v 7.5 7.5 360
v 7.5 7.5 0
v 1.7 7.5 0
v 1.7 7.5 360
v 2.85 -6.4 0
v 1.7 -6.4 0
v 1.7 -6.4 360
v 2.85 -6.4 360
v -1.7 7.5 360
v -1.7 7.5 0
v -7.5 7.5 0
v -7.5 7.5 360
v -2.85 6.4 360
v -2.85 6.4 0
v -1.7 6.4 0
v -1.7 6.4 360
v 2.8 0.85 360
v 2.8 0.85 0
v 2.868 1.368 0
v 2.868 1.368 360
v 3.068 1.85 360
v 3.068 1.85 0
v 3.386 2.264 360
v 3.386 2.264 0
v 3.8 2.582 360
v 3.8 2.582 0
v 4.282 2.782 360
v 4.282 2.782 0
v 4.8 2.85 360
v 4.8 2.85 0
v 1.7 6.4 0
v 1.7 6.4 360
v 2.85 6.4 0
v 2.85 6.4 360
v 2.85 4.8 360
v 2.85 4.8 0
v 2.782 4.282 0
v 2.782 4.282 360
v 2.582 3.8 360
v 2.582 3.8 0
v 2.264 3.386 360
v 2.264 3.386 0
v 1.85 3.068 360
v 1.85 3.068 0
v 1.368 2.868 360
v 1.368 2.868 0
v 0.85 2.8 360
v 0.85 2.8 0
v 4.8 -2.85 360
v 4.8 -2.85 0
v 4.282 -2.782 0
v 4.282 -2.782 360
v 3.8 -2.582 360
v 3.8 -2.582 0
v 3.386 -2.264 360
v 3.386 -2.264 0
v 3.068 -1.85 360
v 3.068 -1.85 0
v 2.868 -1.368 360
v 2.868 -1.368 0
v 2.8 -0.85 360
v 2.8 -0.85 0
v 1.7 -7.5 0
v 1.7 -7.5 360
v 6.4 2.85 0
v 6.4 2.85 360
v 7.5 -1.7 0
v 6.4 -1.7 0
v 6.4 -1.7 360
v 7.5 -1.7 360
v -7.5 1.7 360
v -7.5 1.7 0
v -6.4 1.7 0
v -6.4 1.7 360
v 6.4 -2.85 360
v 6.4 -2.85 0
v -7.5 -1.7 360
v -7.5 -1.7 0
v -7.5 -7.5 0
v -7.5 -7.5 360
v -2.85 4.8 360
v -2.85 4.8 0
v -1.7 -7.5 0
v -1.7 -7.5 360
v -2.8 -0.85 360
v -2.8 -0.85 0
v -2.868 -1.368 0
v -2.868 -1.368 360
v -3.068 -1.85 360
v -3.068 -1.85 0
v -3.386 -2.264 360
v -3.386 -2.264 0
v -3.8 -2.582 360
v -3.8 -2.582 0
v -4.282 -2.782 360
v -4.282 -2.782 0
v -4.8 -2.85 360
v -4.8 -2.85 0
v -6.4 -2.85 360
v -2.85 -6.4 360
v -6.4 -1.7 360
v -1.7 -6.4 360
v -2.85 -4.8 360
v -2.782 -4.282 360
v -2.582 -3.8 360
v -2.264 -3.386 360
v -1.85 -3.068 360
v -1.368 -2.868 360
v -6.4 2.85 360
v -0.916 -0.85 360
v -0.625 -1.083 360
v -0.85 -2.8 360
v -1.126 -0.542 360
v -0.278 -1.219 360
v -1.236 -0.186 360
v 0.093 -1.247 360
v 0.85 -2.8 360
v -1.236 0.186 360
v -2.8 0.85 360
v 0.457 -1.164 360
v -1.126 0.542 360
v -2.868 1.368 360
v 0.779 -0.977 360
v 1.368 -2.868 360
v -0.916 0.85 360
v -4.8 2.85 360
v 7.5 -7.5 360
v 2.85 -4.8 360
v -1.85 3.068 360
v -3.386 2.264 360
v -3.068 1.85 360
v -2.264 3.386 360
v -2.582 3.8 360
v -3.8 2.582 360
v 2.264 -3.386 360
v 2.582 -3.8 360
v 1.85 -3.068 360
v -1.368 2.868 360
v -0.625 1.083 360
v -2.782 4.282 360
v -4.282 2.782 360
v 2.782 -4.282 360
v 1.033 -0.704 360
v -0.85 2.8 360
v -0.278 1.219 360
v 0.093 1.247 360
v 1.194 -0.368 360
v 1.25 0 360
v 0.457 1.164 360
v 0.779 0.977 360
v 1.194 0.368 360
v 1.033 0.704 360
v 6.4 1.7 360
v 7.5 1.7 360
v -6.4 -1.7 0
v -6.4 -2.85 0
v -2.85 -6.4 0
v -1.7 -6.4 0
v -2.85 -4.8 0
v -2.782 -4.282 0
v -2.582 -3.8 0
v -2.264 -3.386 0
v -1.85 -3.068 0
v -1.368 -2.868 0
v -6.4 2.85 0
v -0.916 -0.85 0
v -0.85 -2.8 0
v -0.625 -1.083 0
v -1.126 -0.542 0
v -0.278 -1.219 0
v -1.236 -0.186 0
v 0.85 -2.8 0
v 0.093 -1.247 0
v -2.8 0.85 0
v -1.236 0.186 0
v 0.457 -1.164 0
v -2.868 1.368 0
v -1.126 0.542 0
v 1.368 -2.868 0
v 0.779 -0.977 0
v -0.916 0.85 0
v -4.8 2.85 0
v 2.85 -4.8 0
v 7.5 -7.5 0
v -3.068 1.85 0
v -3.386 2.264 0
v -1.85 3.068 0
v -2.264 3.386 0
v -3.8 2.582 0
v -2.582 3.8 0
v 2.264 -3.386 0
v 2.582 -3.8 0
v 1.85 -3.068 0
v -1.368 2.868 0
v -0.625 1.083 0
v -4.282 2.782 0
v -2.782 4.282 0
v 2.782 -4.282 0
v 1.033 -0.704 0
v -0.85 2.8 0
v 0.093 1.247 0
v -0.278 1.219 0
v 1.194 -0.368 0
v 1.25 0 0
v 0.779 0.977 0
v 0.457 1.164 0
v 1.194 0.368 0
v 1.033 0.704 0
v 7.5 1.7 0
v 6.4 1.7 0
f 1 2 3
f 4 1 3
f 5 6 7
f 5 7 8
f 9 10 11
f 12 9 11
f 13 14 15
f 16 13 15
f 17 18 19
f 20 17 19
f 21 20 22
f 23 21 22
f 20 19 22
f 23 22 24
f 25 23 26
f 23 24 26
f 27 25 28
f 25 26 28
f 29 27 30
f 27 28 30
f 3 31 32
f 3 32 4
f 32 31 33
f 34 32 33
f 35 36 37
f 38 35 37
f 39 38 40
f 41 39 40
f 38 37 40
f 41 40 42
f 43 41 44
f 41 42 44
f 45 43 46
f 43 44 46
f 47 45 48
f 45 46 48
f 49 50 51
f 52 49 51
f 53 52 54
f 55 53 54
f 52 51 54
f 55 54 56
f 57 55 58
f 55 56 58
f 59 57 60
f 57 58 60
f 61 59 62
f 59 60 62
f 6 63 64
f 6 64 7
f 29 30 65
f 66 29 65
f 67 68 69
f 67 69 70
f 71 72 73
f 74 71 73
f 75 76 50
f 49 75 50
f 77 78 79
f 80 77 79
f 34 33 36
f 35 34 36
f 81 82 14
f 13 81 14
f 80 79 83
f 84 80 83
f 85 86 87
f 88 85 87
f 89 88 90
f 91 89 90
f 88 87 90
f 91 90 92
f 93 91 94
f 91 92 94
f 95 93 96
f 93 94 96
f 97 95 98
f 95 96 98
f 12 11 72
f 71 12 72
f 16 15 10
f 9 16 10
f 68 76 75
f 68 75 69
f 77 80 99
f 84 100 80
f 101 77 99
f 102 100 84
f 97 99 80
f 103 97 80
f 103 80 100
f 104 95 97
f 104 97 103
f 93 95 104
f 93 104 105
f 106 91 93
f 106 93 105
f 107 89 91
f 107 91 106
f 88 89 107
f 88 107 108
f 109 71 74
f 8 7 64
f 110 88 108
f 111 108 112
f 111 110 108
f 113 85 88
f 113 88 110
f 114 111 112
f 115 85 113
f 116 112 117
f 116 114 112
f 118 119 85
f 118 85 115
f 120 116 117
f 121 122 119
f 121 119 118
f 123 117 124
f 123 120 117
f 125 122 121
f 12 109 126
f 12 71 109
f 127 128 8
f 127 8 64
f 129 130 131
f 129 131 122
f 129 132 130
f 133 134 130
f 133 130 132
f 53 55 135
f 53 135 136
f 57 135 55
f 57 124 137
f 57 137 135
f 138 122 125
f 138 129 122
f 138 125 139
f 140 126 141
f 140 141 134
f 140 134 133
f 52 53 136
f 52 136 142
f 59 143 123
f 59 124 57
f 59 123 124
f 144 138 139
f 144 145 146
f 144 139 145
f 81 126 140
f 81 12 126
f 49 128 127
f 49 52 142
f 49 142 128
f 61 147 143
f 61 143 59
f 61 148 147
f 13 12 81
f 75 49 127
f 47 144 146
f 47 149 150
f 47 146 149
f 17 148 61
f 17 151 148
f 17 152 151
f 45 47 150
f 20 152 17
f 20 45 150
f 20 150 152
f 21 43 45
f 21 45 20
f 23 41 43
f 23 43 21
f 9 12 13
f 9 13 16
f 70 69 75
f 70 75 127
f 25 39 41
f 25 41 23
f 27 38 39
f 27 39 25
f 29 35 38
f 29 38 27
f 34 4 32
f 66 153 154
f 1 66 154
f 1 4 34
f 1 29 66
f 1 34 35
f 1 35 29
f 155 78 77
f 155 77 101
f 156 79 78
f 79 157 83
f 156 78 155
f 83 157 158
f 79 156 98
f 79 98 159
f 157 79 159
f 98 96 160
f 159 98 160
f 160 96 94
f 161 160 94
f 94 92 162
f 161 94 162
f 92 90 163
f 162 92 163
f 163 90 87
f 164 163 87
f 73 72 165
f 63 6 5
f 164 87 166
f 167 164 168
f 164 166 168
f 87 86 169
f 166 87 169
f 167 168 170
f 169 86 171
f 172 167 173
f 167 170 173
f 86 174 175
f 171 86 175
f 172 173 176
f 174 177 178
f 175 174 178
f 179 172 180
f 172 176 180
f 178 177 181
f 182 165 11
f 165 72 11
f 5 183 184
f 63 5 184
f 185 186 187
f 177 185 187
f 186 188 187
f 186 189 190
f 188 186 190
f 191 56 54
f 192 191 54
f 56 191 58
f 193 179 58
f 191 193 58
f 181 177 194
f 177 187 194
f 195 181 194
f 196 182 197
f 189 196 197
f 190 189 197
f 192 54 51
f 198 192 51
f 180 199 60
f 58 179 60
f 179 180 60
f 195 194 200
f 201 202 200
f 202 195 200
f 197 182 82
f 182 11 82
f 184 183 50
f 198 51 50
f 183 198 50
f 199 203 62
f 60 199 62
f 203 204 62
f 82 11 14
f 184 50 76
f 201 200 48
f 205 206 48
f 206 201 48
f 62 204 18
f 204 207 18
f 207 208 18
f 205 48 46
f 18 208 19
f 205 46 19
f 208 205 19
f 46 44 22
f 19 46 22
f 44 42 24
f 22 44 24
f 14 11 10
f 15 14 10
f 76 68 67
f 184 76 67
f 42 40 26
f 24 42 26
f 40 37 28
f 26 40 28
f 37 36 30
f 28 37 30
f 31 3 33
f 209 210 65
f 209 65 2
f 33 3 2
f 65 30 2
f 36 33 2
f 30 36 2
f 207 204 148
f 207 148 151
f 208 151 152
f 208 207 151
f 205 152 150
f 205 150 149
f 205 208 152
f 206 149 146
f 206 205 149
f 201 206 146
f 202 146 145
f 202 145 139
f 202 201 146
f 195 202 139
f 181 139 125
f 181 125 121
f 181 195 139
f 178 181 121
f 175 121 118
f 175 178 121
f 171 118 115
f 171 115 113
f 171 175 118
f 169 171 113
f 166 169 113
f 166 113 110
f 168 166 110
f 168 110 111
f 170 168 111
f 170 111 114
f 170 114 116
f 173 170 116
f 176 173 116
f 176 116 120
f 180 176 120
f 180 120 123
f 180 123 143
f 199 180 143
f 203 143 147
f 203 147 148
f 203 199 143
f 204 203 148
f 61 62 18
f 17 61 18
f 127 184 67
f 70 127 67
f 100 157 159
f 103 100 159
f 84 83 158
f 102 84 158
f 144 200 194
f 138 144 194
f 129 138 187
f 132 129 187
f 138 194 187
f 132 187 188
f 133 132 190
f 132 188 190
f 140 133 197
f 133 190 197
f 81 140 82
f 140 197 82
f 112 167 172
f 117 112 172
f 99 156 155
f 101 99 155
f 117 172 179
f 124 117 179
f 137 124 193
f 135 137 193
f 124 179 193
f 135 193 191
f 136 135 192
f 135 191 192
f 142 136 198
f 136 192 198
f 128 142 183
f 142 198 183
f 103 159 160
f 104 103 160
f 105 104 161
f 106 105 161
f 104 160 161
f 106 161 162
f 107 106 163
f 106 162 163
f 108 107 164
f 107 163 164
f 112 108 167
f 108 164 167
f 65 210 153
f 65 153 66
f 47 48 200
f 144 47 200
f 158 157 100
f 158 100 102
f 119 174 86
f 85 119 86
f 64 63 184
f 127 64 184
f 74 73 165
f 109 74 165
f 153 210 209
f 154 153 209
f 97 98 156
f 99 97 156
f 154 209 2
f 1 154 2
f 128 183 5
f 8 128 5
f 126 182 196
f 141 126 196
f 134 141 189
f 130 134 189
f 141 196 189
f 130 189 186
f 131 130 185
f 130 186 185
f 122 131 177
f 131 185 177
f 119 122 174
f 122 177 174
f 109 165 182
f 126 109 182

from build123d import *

# Parameters (mm, degrees)
F0_R     = 1.25
F0_W     = 1.1
F0_H     = 1.15
F0_W_2   = 1.15
F0_H_2   = 1.1
F1_DEPTH = 360


with BuildPart() as f1:
    # F0 (on Top) → F1 (new body)
    with BuildSketch(Plane.XY):
        with BuildLine():
            Line((-2.85, 7.5), (-7.5, 7.5))
            Line((-7.5, 7.5), (-7.5, 2.85))
            Line((-7.5, 2.85), (-6.4, 2.85))
            Line((-6.4, 2.85), (-4.8, 2.85))
            ThreePointArc((-4.8, 2.85), (-3.385786, 2.264214), (-2.8, 0.85))
            Line((-2.8, 0.85), (-2.8, -0.85))
            ThreePointArc((-2.8, -0.85), (-3.385786, -2.264214), (-4.8, -2.85))
            Line((-4.8, -2.85), (-6.4, -2.85))
            Line((-6.4, -2.85), (-7.5, -2.85))
            Line((-7.5, -2.85), (-7.5, -7.5))
            Line((-7.5, -7.5), (-2.85, -7.5))
            Line((-2.85, -7.5), (-2.85, -6.4))
            Line((-2.85, -6.4), (-2.85, -4.8))
            ThreePointArc((-2.85, -4.8), (-2.264214, -3.385786), (-0.85, -2.8))
            Line((-0.85, -2.8), (0.85, -2.8))
            ThreePointArc((0.85, -2.8), (2.264214, -3.385786), (2.85, -4.8))
            Line((2.85, -4.8), (2.85, -6.4))
            Line((2.85, -6.4), (2.85, -7.5))
            Line((2.85, -7.5), (7.5, -7.5))
            Line((7.5, -7.5), (7.5, -2.85))
            Line((7.5, -2.85), (6.4, -2.85))
            Line((6.4, -2.85), (4.8, -2.85))
            ThreePointArc((4.8, -2.85), (3.385786, -2.264214), (2.8, -0.85))
            Line((2.8, -0.85), (2.8, 0.85))
            ThreePointArc((2.8, 0.85), (3.385786, 2.264214), (4.8, 2.85))
            Line((4.8, 2.85), (6.4, 2.85))
            Line((6.4, 2.85), (7.5, 2.85))
            Line((7.5, 2.85), (7.5, 7.5))
            Line((7.5, 7.5), (2.85, 7.5))
            Line((2.85, 7.5), (2.85, 6.4))
            Line((2.85, 6.4), (2.85, 4.8))
            ThreePointArc((2.85, 4.8), (2.264214, 3.385786), (0.85, 2.8))
            Line((0.85, 2.8), (-0.85, 2.8))
            ThreePointArc((-0.85, 2.8), (-2.264214, 3.385786), (-2.85, 4.8))
            Line((-2.85, 4.8), (-2.85, 6.4))
            Line((-2.85, 6.4), (-2.85, 7.5))
        make_face()
        Circle(F0_R, mode=Mode.SUBTRACT)
        with Locations((-6.95, 2.275)):
            Rectangle(F0_W, F0_H)
        with Locations((-6.95, -2.275)):
            Rectangle(F0_W, F0_H)
        with Locations((-2.275, 6.95)):
            Rectangle(F0_W_2, F0_H_2)
        with Locations((2.275, 6.95)):
            Rectangle(F0_W_2, F0_H_2)
        with Locations((6.95, 2.275)):
            Rectangle(F0_W, F0_H)
        with Locations((6.95, -2.275)):
            Rectangle(F0_W, F0_H)
        with Locations((-2.275, -6.95)):
            Rectangle(F0_W_2, F0_H_2)
        with Locations((2.275, -6.95)):
            Rectangle(F0_W_2, F0_H_2)
    extrude(amount=F1_DEPTH)


solid = f1.part
